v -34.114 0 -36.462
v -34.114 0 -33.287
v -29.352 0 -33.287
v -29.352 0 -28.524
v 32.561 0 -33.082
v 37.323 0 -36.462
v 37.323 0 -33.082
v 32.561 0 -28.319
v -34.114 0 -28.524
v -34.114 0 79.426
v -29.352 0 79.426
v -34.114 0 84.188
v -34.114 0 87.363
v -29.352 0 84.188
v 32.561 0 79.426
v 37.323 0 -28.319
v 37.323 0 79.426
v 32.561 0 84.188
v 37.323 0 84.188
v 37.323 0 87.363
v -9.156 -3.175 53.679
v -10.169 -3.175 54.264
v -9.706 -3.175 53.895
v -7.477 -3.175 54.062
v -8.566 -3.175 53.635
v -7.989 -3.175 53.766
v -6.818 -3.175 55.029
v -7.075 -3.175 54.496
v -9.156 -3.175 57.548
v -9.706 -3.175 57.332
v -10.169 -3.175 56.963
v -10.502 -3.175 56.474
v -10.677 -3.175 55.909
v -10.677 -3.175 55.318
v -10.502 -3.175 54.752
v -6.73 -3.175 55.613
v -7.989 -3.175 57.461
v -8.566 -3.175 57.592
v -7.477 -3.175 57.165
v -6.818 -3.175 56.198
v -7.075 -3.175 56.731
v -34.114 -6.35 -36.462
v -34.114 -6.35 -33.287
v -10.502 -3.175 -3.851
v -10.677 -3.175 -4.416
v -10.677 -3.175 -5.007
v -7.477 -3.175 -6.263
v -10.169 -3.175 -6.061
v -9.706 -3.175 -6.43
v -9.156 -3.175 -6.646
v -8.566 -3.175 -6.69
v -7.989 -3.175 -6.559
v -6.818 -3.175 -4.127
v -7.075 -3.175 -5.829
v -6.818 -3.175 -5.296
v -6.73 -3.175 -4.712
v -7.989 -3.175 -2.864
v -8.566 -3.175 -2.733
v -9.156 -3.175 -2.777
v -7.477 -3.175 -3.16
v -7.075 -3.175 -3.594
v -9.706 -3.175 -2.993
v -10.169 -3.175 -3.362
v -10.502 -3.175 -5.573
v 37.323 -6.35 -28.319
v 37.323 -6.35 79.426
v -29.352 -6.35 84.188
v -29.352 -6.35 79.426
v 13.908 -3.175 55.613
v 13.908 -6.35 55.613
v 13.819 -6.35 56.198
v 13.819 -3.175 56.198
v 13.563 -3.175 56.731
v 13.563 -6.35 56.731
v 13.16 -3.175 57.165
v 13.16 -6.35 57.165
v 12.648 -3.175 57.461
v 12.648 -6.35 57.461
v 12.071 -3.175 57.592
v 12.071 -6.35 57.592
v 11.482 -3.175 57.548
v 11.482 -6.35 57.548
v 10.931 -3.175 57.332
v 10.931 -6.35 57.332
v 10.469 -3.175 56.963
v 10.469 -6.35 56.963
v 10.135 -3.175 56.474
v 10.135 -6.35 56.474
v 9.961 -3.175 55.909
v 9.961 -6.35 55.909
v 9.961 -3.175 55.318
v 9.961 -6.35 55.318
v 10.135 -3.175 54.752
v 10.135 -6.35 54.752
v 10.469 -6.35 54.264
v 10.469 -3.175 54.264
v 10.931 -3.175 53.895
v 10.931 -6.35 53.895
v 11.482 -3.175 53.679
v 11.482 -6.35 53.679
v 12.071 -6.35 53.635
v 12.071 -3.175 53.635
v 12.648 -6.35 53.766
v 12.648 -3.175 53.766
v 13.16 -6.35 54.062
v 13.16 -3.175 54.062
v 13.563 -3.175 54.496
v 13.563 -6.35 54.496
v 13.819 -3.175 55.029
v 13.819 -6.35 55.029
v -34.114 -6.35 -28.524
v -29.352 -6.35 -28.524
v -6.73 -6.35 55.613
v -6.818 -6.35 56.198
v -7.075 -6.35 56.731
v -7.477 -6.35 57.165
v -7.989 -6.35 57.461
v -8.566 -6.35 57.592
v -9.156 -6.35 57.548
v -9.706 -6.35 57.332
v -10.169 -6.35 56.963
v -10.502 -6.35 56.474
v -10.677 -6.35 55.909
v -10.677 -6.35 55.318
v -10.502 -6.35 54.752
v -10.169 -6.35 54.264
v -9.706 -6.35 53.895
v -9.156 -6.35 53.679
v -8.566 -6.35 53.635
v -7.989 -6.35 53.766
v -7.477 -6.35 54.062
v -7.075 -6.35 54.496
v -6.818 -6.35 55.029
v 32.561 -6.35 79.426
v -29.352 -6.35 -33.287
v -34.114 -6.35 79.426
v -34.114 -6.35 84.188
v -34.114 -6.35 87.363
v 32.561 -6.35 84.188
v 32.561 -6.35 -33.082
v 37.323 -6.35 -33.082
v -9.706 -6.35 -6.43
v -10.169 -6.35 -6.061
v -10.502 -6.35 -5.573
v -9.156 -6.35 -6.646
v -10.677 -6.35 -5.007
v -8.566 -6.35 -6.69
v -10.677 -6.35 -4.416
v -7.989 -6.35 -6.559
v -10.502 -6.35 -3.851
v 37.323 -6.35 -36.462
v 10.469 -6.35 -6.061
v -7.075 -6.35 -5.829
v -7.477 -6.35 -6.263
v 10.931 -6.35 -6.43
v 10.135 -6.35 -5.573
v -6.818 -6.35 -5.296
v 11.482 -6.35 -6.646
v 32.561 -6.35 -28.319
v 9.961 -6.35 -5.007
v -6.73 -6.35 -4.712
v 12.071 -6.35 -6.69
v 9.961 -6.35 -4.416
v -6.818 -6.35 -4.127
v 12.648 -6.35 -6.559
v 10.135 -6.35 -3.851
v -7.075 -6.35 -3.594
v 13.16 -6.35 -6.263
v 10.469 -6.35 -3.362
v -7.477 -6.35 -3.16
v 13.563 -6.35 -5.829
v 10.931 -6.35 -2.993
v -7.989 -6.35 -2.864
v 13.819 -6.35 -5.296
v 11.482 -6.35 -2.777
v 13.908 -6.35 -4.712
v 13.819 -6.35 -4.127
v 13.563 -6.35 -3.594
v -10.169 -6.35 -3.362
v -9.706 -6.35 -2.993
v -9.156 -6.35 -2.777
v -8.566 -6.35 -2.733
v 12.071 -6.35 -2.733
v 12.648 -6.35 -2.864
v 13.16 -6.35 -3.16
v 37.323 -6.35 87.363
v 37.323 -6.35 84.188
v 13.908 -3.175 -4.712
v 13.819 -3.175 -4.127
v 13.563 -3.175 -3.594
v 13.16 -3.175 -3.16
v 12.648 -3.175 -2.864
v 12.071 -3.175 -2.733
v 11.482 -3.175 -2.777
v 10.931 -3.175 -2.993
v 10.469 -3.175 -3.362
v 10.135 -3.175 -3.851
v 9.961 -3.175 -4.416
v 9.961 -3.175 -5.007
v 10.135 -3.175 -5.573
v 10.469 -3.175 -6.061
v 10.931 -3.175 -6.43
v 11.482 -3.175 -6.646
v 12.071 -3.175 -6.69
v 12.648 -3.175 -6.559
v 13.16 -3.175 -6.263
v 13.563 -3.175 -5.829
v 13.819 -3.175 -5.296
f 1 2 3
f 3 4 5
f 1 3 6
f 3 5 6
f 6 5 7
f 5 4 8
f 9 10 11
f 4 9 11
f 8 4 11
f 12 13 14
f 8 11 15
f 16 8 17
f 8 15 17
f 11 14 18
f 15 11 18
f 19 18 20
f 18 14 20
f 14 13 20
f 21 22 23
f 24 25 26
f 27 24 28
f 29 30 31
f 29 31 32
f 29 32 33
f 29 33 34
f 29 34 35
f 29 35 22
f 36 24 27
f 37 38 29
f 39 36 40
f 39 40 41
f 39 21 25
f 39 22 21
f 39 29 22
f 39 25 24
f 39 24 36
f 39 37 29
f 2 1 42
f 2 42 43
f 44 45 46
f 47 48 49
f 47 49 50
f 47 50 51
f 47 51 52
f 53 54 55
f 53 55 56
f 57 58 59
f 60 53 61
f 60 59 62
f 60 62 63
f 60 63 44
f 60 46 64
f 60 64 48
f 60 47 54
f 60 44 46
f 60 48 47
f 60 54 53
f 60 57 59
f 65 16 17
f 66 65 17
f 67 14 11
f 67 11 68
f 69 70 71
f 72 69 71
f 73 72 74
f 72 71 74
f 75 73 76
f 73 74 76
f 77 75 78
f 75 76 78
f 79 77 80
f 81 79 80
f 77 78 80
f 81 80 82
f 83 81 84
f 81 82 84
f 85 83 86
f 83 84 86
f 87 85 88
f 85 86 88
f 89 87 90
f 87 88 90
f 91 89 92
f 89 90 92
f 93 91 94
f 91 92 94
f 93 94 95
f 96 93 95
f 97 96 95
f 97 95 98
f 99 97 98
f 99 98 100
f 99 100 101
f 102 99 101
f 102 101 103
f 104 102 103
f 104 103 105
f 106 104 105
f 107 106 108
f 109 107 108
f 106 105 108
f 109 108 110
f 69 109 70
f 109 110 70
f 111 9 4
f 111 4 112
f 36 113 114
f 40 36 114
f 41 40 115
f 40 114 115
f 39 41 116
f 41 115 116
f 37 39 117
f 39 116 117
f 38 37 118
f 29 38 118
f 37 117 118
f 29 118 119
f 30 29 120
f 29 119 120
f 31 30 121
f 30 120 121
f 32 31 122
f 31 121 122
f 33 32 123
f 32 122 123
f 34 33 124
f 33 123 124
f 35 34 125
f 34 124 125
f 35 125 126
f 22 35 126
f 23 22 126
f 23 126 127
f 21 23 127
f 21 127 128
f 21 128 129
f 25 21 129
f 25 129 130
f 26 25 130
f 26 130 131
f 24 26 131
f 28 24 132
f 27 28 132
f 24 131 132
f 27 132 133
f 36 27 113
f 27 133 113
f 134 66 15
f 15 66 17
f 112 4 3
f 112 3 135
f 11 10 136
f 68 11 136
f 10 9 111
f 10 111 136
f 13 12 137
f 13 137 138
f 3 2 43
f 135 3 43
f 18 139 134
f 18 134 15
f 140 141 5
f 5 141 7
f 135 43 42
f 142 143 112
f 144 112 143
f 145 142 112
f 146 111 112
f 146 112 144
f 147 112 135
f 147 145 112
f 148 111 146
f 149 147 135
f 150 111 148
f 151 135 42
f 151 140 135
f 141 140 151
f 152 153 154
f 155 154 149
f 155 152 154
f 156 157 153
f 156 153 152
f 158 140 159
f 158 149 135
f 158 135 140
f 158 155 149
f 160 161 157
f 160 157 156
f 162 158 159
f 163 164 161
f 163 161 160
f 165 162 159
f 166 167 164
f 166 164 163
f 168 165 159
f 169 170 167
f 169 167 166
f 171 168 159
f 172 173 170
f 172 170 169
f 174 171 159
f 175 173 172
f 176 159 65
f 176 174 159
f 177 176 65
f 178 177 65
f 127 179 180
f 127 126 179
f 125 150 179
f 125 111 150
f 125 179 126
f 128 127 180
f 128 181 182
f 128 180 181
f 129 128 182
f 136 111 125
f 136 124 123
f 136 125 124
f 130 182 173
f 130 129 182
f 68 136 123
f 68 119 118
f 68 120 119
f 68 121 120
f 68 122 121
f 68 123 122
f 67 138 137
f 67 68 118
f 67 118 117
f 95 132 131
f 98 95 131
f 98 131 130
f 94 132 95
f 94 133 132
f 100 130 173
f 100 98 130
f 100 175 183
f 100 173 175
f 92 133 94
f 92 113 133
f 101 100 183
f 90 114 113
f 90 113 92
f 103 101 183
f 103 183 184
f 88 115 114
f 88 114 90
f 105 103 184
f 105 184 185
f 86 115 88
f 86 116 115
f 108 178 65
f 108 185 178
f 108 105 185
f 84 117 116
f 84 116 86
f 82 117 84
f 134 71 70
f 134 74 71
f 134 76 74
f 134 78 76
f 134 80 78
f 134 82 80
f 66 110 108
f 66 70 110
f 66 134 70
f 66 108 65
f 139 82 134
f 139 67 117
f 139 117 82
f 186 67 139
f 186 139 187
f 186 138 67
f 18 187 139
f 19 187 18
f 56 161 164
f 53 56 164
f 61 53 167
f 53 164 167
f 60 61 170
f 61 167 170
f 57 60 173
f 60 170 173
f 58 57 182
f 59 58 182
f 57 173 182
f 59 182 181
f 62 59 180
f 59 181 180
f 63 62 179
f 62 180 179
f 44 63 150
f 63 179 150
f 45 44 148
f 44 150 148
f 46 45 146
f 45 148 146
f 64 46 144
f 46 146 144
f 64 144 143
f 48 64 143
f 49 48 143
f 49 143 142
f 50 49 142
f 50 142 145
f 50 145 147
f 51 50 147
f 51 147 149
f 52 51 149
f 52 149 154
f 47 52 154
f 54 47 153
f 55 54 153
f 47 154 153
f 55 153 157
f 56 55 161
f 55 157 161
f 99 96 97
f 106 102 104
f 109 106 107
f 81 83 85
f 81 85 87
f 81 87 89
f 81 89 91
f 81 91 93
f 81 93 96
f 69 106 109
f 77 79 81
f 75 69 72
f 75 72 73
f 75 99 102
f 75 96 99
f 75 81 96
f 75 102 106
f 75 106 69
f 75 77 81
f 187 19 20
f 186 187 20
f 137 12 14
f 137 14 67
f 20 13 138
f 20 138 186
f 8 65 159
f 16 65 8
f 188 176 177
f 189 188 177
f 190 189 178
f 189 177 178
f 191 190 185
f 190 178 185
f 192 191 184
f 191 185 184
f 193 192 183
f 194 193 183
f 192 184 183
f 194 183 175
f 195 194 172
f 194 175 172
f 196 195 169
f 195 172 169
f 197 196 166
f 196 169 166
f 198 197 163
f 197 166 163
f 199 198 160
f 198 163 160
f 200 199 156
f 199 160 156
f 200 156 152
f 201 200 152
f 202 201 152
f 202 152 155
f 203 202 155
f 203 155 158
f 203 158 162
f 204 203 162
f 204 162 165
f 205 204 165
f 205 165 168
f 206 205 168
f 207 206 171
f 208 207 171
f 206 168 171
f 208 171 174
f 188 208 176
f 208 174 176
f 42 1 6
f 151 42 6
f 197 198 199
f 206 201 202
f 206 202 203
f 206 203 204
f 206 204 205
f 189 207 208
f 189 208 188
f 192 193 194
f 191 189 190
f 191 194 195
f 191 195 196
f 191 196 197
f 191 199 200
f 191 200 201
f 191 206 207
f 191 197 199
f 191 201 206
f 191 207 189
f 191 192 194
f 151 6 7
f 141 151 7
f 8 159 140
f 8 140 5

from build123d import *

# Parameters (mm, degrees)
F0_W      = 71.4375
F0_H      = 123.825
F1_DEPTH  = 6.35
F2_W      = 6.35
F2_H      = 4.7625
F3_DEPTH  = 4.7625
F4_W      = 6.35
F4_H      = 4.7625
F5_DEPTH  = 4.7625
F6_W      = 6.35
F6_H      = 4.7625
F7_DEPTH  = 4.7625
F8_W      = 6.35
F8_H      = 4.7625
F9_DEPTH  = 4.7625
F10_R     = 1.984375
F11_DEPTH = 3.175


with BuildPart() as f1:
    # F0 (on Front) → F1 (new body)
    with BuildSketch(Plane.XZ):
        with Locations((1.604452, 25.450979)):
            Rectangle(F0_W, F0_H)
    extrude(amount=F1_DEPTH)

    # F2 (on face) → F3 (cut)
    with BuildSketch(Plane.YZ.offset(37.323202)):
        with Locations((-3.175, 81.807229)):
            Rectangle(F2_W, F2_H)
    extrude(amount=-F3_DEPTH, mode=Mode.SUBTRACT)

    # F4 (on face) → F5 (cut)
    with BuildSketch(Plane.YZ.offset(37.323202)):
        with Locations((-3.175, -30.70041)):
            Rectangle(F4_W, F4_H)
    extrude(amount=-F5_DEPTH, mode=Mode.SUBTRACT)

    # F6 (on face) → F7 (cut)
    with BuildSketch(Plane(origin=(-34.114298, 0, 0), x_dir=(0, -1, 0), z_dir=(-1, 0, 0))):
        with Locations((3.175, 81.807229)):
            Rectangle(F6_W, F6_H)
    extrude(amount=-F7_DEPTH, mode=Mode.SUBTRACT)

    # F8 (on face) → F9 (cut)
    with BuildSketch(Plane(origin=(-34.114298, 0, 0), x_dir=(0, -1, 0), z_dir=(-1, 0, 0))):
        with Locations((3.175, -30.905271)):
            Rectangle(F8_W, F8_H)
    extrude(amount=-F9_DEPTH, mode=Mode.SUBTRACT)

    # F10 (on face) → F11 (cut)
    with BuildSketch(Plane.XZ.offset(6.35)):
        with Locations((-8.714298, 55.613479)):
            Circle(F10_R)
        with Locations((11.923202, 55.613479)):
            Circle(F10_R)
        with Locations((-8.714298, -4.711521)):
            Circle(F10_R)
        with Locations((11.923202, -4.711521)):
            Circle(F10_R)
    extrude(amount=-F11_DEPTH, mode=Mode.SUBTRACT)


solid = f1.part
